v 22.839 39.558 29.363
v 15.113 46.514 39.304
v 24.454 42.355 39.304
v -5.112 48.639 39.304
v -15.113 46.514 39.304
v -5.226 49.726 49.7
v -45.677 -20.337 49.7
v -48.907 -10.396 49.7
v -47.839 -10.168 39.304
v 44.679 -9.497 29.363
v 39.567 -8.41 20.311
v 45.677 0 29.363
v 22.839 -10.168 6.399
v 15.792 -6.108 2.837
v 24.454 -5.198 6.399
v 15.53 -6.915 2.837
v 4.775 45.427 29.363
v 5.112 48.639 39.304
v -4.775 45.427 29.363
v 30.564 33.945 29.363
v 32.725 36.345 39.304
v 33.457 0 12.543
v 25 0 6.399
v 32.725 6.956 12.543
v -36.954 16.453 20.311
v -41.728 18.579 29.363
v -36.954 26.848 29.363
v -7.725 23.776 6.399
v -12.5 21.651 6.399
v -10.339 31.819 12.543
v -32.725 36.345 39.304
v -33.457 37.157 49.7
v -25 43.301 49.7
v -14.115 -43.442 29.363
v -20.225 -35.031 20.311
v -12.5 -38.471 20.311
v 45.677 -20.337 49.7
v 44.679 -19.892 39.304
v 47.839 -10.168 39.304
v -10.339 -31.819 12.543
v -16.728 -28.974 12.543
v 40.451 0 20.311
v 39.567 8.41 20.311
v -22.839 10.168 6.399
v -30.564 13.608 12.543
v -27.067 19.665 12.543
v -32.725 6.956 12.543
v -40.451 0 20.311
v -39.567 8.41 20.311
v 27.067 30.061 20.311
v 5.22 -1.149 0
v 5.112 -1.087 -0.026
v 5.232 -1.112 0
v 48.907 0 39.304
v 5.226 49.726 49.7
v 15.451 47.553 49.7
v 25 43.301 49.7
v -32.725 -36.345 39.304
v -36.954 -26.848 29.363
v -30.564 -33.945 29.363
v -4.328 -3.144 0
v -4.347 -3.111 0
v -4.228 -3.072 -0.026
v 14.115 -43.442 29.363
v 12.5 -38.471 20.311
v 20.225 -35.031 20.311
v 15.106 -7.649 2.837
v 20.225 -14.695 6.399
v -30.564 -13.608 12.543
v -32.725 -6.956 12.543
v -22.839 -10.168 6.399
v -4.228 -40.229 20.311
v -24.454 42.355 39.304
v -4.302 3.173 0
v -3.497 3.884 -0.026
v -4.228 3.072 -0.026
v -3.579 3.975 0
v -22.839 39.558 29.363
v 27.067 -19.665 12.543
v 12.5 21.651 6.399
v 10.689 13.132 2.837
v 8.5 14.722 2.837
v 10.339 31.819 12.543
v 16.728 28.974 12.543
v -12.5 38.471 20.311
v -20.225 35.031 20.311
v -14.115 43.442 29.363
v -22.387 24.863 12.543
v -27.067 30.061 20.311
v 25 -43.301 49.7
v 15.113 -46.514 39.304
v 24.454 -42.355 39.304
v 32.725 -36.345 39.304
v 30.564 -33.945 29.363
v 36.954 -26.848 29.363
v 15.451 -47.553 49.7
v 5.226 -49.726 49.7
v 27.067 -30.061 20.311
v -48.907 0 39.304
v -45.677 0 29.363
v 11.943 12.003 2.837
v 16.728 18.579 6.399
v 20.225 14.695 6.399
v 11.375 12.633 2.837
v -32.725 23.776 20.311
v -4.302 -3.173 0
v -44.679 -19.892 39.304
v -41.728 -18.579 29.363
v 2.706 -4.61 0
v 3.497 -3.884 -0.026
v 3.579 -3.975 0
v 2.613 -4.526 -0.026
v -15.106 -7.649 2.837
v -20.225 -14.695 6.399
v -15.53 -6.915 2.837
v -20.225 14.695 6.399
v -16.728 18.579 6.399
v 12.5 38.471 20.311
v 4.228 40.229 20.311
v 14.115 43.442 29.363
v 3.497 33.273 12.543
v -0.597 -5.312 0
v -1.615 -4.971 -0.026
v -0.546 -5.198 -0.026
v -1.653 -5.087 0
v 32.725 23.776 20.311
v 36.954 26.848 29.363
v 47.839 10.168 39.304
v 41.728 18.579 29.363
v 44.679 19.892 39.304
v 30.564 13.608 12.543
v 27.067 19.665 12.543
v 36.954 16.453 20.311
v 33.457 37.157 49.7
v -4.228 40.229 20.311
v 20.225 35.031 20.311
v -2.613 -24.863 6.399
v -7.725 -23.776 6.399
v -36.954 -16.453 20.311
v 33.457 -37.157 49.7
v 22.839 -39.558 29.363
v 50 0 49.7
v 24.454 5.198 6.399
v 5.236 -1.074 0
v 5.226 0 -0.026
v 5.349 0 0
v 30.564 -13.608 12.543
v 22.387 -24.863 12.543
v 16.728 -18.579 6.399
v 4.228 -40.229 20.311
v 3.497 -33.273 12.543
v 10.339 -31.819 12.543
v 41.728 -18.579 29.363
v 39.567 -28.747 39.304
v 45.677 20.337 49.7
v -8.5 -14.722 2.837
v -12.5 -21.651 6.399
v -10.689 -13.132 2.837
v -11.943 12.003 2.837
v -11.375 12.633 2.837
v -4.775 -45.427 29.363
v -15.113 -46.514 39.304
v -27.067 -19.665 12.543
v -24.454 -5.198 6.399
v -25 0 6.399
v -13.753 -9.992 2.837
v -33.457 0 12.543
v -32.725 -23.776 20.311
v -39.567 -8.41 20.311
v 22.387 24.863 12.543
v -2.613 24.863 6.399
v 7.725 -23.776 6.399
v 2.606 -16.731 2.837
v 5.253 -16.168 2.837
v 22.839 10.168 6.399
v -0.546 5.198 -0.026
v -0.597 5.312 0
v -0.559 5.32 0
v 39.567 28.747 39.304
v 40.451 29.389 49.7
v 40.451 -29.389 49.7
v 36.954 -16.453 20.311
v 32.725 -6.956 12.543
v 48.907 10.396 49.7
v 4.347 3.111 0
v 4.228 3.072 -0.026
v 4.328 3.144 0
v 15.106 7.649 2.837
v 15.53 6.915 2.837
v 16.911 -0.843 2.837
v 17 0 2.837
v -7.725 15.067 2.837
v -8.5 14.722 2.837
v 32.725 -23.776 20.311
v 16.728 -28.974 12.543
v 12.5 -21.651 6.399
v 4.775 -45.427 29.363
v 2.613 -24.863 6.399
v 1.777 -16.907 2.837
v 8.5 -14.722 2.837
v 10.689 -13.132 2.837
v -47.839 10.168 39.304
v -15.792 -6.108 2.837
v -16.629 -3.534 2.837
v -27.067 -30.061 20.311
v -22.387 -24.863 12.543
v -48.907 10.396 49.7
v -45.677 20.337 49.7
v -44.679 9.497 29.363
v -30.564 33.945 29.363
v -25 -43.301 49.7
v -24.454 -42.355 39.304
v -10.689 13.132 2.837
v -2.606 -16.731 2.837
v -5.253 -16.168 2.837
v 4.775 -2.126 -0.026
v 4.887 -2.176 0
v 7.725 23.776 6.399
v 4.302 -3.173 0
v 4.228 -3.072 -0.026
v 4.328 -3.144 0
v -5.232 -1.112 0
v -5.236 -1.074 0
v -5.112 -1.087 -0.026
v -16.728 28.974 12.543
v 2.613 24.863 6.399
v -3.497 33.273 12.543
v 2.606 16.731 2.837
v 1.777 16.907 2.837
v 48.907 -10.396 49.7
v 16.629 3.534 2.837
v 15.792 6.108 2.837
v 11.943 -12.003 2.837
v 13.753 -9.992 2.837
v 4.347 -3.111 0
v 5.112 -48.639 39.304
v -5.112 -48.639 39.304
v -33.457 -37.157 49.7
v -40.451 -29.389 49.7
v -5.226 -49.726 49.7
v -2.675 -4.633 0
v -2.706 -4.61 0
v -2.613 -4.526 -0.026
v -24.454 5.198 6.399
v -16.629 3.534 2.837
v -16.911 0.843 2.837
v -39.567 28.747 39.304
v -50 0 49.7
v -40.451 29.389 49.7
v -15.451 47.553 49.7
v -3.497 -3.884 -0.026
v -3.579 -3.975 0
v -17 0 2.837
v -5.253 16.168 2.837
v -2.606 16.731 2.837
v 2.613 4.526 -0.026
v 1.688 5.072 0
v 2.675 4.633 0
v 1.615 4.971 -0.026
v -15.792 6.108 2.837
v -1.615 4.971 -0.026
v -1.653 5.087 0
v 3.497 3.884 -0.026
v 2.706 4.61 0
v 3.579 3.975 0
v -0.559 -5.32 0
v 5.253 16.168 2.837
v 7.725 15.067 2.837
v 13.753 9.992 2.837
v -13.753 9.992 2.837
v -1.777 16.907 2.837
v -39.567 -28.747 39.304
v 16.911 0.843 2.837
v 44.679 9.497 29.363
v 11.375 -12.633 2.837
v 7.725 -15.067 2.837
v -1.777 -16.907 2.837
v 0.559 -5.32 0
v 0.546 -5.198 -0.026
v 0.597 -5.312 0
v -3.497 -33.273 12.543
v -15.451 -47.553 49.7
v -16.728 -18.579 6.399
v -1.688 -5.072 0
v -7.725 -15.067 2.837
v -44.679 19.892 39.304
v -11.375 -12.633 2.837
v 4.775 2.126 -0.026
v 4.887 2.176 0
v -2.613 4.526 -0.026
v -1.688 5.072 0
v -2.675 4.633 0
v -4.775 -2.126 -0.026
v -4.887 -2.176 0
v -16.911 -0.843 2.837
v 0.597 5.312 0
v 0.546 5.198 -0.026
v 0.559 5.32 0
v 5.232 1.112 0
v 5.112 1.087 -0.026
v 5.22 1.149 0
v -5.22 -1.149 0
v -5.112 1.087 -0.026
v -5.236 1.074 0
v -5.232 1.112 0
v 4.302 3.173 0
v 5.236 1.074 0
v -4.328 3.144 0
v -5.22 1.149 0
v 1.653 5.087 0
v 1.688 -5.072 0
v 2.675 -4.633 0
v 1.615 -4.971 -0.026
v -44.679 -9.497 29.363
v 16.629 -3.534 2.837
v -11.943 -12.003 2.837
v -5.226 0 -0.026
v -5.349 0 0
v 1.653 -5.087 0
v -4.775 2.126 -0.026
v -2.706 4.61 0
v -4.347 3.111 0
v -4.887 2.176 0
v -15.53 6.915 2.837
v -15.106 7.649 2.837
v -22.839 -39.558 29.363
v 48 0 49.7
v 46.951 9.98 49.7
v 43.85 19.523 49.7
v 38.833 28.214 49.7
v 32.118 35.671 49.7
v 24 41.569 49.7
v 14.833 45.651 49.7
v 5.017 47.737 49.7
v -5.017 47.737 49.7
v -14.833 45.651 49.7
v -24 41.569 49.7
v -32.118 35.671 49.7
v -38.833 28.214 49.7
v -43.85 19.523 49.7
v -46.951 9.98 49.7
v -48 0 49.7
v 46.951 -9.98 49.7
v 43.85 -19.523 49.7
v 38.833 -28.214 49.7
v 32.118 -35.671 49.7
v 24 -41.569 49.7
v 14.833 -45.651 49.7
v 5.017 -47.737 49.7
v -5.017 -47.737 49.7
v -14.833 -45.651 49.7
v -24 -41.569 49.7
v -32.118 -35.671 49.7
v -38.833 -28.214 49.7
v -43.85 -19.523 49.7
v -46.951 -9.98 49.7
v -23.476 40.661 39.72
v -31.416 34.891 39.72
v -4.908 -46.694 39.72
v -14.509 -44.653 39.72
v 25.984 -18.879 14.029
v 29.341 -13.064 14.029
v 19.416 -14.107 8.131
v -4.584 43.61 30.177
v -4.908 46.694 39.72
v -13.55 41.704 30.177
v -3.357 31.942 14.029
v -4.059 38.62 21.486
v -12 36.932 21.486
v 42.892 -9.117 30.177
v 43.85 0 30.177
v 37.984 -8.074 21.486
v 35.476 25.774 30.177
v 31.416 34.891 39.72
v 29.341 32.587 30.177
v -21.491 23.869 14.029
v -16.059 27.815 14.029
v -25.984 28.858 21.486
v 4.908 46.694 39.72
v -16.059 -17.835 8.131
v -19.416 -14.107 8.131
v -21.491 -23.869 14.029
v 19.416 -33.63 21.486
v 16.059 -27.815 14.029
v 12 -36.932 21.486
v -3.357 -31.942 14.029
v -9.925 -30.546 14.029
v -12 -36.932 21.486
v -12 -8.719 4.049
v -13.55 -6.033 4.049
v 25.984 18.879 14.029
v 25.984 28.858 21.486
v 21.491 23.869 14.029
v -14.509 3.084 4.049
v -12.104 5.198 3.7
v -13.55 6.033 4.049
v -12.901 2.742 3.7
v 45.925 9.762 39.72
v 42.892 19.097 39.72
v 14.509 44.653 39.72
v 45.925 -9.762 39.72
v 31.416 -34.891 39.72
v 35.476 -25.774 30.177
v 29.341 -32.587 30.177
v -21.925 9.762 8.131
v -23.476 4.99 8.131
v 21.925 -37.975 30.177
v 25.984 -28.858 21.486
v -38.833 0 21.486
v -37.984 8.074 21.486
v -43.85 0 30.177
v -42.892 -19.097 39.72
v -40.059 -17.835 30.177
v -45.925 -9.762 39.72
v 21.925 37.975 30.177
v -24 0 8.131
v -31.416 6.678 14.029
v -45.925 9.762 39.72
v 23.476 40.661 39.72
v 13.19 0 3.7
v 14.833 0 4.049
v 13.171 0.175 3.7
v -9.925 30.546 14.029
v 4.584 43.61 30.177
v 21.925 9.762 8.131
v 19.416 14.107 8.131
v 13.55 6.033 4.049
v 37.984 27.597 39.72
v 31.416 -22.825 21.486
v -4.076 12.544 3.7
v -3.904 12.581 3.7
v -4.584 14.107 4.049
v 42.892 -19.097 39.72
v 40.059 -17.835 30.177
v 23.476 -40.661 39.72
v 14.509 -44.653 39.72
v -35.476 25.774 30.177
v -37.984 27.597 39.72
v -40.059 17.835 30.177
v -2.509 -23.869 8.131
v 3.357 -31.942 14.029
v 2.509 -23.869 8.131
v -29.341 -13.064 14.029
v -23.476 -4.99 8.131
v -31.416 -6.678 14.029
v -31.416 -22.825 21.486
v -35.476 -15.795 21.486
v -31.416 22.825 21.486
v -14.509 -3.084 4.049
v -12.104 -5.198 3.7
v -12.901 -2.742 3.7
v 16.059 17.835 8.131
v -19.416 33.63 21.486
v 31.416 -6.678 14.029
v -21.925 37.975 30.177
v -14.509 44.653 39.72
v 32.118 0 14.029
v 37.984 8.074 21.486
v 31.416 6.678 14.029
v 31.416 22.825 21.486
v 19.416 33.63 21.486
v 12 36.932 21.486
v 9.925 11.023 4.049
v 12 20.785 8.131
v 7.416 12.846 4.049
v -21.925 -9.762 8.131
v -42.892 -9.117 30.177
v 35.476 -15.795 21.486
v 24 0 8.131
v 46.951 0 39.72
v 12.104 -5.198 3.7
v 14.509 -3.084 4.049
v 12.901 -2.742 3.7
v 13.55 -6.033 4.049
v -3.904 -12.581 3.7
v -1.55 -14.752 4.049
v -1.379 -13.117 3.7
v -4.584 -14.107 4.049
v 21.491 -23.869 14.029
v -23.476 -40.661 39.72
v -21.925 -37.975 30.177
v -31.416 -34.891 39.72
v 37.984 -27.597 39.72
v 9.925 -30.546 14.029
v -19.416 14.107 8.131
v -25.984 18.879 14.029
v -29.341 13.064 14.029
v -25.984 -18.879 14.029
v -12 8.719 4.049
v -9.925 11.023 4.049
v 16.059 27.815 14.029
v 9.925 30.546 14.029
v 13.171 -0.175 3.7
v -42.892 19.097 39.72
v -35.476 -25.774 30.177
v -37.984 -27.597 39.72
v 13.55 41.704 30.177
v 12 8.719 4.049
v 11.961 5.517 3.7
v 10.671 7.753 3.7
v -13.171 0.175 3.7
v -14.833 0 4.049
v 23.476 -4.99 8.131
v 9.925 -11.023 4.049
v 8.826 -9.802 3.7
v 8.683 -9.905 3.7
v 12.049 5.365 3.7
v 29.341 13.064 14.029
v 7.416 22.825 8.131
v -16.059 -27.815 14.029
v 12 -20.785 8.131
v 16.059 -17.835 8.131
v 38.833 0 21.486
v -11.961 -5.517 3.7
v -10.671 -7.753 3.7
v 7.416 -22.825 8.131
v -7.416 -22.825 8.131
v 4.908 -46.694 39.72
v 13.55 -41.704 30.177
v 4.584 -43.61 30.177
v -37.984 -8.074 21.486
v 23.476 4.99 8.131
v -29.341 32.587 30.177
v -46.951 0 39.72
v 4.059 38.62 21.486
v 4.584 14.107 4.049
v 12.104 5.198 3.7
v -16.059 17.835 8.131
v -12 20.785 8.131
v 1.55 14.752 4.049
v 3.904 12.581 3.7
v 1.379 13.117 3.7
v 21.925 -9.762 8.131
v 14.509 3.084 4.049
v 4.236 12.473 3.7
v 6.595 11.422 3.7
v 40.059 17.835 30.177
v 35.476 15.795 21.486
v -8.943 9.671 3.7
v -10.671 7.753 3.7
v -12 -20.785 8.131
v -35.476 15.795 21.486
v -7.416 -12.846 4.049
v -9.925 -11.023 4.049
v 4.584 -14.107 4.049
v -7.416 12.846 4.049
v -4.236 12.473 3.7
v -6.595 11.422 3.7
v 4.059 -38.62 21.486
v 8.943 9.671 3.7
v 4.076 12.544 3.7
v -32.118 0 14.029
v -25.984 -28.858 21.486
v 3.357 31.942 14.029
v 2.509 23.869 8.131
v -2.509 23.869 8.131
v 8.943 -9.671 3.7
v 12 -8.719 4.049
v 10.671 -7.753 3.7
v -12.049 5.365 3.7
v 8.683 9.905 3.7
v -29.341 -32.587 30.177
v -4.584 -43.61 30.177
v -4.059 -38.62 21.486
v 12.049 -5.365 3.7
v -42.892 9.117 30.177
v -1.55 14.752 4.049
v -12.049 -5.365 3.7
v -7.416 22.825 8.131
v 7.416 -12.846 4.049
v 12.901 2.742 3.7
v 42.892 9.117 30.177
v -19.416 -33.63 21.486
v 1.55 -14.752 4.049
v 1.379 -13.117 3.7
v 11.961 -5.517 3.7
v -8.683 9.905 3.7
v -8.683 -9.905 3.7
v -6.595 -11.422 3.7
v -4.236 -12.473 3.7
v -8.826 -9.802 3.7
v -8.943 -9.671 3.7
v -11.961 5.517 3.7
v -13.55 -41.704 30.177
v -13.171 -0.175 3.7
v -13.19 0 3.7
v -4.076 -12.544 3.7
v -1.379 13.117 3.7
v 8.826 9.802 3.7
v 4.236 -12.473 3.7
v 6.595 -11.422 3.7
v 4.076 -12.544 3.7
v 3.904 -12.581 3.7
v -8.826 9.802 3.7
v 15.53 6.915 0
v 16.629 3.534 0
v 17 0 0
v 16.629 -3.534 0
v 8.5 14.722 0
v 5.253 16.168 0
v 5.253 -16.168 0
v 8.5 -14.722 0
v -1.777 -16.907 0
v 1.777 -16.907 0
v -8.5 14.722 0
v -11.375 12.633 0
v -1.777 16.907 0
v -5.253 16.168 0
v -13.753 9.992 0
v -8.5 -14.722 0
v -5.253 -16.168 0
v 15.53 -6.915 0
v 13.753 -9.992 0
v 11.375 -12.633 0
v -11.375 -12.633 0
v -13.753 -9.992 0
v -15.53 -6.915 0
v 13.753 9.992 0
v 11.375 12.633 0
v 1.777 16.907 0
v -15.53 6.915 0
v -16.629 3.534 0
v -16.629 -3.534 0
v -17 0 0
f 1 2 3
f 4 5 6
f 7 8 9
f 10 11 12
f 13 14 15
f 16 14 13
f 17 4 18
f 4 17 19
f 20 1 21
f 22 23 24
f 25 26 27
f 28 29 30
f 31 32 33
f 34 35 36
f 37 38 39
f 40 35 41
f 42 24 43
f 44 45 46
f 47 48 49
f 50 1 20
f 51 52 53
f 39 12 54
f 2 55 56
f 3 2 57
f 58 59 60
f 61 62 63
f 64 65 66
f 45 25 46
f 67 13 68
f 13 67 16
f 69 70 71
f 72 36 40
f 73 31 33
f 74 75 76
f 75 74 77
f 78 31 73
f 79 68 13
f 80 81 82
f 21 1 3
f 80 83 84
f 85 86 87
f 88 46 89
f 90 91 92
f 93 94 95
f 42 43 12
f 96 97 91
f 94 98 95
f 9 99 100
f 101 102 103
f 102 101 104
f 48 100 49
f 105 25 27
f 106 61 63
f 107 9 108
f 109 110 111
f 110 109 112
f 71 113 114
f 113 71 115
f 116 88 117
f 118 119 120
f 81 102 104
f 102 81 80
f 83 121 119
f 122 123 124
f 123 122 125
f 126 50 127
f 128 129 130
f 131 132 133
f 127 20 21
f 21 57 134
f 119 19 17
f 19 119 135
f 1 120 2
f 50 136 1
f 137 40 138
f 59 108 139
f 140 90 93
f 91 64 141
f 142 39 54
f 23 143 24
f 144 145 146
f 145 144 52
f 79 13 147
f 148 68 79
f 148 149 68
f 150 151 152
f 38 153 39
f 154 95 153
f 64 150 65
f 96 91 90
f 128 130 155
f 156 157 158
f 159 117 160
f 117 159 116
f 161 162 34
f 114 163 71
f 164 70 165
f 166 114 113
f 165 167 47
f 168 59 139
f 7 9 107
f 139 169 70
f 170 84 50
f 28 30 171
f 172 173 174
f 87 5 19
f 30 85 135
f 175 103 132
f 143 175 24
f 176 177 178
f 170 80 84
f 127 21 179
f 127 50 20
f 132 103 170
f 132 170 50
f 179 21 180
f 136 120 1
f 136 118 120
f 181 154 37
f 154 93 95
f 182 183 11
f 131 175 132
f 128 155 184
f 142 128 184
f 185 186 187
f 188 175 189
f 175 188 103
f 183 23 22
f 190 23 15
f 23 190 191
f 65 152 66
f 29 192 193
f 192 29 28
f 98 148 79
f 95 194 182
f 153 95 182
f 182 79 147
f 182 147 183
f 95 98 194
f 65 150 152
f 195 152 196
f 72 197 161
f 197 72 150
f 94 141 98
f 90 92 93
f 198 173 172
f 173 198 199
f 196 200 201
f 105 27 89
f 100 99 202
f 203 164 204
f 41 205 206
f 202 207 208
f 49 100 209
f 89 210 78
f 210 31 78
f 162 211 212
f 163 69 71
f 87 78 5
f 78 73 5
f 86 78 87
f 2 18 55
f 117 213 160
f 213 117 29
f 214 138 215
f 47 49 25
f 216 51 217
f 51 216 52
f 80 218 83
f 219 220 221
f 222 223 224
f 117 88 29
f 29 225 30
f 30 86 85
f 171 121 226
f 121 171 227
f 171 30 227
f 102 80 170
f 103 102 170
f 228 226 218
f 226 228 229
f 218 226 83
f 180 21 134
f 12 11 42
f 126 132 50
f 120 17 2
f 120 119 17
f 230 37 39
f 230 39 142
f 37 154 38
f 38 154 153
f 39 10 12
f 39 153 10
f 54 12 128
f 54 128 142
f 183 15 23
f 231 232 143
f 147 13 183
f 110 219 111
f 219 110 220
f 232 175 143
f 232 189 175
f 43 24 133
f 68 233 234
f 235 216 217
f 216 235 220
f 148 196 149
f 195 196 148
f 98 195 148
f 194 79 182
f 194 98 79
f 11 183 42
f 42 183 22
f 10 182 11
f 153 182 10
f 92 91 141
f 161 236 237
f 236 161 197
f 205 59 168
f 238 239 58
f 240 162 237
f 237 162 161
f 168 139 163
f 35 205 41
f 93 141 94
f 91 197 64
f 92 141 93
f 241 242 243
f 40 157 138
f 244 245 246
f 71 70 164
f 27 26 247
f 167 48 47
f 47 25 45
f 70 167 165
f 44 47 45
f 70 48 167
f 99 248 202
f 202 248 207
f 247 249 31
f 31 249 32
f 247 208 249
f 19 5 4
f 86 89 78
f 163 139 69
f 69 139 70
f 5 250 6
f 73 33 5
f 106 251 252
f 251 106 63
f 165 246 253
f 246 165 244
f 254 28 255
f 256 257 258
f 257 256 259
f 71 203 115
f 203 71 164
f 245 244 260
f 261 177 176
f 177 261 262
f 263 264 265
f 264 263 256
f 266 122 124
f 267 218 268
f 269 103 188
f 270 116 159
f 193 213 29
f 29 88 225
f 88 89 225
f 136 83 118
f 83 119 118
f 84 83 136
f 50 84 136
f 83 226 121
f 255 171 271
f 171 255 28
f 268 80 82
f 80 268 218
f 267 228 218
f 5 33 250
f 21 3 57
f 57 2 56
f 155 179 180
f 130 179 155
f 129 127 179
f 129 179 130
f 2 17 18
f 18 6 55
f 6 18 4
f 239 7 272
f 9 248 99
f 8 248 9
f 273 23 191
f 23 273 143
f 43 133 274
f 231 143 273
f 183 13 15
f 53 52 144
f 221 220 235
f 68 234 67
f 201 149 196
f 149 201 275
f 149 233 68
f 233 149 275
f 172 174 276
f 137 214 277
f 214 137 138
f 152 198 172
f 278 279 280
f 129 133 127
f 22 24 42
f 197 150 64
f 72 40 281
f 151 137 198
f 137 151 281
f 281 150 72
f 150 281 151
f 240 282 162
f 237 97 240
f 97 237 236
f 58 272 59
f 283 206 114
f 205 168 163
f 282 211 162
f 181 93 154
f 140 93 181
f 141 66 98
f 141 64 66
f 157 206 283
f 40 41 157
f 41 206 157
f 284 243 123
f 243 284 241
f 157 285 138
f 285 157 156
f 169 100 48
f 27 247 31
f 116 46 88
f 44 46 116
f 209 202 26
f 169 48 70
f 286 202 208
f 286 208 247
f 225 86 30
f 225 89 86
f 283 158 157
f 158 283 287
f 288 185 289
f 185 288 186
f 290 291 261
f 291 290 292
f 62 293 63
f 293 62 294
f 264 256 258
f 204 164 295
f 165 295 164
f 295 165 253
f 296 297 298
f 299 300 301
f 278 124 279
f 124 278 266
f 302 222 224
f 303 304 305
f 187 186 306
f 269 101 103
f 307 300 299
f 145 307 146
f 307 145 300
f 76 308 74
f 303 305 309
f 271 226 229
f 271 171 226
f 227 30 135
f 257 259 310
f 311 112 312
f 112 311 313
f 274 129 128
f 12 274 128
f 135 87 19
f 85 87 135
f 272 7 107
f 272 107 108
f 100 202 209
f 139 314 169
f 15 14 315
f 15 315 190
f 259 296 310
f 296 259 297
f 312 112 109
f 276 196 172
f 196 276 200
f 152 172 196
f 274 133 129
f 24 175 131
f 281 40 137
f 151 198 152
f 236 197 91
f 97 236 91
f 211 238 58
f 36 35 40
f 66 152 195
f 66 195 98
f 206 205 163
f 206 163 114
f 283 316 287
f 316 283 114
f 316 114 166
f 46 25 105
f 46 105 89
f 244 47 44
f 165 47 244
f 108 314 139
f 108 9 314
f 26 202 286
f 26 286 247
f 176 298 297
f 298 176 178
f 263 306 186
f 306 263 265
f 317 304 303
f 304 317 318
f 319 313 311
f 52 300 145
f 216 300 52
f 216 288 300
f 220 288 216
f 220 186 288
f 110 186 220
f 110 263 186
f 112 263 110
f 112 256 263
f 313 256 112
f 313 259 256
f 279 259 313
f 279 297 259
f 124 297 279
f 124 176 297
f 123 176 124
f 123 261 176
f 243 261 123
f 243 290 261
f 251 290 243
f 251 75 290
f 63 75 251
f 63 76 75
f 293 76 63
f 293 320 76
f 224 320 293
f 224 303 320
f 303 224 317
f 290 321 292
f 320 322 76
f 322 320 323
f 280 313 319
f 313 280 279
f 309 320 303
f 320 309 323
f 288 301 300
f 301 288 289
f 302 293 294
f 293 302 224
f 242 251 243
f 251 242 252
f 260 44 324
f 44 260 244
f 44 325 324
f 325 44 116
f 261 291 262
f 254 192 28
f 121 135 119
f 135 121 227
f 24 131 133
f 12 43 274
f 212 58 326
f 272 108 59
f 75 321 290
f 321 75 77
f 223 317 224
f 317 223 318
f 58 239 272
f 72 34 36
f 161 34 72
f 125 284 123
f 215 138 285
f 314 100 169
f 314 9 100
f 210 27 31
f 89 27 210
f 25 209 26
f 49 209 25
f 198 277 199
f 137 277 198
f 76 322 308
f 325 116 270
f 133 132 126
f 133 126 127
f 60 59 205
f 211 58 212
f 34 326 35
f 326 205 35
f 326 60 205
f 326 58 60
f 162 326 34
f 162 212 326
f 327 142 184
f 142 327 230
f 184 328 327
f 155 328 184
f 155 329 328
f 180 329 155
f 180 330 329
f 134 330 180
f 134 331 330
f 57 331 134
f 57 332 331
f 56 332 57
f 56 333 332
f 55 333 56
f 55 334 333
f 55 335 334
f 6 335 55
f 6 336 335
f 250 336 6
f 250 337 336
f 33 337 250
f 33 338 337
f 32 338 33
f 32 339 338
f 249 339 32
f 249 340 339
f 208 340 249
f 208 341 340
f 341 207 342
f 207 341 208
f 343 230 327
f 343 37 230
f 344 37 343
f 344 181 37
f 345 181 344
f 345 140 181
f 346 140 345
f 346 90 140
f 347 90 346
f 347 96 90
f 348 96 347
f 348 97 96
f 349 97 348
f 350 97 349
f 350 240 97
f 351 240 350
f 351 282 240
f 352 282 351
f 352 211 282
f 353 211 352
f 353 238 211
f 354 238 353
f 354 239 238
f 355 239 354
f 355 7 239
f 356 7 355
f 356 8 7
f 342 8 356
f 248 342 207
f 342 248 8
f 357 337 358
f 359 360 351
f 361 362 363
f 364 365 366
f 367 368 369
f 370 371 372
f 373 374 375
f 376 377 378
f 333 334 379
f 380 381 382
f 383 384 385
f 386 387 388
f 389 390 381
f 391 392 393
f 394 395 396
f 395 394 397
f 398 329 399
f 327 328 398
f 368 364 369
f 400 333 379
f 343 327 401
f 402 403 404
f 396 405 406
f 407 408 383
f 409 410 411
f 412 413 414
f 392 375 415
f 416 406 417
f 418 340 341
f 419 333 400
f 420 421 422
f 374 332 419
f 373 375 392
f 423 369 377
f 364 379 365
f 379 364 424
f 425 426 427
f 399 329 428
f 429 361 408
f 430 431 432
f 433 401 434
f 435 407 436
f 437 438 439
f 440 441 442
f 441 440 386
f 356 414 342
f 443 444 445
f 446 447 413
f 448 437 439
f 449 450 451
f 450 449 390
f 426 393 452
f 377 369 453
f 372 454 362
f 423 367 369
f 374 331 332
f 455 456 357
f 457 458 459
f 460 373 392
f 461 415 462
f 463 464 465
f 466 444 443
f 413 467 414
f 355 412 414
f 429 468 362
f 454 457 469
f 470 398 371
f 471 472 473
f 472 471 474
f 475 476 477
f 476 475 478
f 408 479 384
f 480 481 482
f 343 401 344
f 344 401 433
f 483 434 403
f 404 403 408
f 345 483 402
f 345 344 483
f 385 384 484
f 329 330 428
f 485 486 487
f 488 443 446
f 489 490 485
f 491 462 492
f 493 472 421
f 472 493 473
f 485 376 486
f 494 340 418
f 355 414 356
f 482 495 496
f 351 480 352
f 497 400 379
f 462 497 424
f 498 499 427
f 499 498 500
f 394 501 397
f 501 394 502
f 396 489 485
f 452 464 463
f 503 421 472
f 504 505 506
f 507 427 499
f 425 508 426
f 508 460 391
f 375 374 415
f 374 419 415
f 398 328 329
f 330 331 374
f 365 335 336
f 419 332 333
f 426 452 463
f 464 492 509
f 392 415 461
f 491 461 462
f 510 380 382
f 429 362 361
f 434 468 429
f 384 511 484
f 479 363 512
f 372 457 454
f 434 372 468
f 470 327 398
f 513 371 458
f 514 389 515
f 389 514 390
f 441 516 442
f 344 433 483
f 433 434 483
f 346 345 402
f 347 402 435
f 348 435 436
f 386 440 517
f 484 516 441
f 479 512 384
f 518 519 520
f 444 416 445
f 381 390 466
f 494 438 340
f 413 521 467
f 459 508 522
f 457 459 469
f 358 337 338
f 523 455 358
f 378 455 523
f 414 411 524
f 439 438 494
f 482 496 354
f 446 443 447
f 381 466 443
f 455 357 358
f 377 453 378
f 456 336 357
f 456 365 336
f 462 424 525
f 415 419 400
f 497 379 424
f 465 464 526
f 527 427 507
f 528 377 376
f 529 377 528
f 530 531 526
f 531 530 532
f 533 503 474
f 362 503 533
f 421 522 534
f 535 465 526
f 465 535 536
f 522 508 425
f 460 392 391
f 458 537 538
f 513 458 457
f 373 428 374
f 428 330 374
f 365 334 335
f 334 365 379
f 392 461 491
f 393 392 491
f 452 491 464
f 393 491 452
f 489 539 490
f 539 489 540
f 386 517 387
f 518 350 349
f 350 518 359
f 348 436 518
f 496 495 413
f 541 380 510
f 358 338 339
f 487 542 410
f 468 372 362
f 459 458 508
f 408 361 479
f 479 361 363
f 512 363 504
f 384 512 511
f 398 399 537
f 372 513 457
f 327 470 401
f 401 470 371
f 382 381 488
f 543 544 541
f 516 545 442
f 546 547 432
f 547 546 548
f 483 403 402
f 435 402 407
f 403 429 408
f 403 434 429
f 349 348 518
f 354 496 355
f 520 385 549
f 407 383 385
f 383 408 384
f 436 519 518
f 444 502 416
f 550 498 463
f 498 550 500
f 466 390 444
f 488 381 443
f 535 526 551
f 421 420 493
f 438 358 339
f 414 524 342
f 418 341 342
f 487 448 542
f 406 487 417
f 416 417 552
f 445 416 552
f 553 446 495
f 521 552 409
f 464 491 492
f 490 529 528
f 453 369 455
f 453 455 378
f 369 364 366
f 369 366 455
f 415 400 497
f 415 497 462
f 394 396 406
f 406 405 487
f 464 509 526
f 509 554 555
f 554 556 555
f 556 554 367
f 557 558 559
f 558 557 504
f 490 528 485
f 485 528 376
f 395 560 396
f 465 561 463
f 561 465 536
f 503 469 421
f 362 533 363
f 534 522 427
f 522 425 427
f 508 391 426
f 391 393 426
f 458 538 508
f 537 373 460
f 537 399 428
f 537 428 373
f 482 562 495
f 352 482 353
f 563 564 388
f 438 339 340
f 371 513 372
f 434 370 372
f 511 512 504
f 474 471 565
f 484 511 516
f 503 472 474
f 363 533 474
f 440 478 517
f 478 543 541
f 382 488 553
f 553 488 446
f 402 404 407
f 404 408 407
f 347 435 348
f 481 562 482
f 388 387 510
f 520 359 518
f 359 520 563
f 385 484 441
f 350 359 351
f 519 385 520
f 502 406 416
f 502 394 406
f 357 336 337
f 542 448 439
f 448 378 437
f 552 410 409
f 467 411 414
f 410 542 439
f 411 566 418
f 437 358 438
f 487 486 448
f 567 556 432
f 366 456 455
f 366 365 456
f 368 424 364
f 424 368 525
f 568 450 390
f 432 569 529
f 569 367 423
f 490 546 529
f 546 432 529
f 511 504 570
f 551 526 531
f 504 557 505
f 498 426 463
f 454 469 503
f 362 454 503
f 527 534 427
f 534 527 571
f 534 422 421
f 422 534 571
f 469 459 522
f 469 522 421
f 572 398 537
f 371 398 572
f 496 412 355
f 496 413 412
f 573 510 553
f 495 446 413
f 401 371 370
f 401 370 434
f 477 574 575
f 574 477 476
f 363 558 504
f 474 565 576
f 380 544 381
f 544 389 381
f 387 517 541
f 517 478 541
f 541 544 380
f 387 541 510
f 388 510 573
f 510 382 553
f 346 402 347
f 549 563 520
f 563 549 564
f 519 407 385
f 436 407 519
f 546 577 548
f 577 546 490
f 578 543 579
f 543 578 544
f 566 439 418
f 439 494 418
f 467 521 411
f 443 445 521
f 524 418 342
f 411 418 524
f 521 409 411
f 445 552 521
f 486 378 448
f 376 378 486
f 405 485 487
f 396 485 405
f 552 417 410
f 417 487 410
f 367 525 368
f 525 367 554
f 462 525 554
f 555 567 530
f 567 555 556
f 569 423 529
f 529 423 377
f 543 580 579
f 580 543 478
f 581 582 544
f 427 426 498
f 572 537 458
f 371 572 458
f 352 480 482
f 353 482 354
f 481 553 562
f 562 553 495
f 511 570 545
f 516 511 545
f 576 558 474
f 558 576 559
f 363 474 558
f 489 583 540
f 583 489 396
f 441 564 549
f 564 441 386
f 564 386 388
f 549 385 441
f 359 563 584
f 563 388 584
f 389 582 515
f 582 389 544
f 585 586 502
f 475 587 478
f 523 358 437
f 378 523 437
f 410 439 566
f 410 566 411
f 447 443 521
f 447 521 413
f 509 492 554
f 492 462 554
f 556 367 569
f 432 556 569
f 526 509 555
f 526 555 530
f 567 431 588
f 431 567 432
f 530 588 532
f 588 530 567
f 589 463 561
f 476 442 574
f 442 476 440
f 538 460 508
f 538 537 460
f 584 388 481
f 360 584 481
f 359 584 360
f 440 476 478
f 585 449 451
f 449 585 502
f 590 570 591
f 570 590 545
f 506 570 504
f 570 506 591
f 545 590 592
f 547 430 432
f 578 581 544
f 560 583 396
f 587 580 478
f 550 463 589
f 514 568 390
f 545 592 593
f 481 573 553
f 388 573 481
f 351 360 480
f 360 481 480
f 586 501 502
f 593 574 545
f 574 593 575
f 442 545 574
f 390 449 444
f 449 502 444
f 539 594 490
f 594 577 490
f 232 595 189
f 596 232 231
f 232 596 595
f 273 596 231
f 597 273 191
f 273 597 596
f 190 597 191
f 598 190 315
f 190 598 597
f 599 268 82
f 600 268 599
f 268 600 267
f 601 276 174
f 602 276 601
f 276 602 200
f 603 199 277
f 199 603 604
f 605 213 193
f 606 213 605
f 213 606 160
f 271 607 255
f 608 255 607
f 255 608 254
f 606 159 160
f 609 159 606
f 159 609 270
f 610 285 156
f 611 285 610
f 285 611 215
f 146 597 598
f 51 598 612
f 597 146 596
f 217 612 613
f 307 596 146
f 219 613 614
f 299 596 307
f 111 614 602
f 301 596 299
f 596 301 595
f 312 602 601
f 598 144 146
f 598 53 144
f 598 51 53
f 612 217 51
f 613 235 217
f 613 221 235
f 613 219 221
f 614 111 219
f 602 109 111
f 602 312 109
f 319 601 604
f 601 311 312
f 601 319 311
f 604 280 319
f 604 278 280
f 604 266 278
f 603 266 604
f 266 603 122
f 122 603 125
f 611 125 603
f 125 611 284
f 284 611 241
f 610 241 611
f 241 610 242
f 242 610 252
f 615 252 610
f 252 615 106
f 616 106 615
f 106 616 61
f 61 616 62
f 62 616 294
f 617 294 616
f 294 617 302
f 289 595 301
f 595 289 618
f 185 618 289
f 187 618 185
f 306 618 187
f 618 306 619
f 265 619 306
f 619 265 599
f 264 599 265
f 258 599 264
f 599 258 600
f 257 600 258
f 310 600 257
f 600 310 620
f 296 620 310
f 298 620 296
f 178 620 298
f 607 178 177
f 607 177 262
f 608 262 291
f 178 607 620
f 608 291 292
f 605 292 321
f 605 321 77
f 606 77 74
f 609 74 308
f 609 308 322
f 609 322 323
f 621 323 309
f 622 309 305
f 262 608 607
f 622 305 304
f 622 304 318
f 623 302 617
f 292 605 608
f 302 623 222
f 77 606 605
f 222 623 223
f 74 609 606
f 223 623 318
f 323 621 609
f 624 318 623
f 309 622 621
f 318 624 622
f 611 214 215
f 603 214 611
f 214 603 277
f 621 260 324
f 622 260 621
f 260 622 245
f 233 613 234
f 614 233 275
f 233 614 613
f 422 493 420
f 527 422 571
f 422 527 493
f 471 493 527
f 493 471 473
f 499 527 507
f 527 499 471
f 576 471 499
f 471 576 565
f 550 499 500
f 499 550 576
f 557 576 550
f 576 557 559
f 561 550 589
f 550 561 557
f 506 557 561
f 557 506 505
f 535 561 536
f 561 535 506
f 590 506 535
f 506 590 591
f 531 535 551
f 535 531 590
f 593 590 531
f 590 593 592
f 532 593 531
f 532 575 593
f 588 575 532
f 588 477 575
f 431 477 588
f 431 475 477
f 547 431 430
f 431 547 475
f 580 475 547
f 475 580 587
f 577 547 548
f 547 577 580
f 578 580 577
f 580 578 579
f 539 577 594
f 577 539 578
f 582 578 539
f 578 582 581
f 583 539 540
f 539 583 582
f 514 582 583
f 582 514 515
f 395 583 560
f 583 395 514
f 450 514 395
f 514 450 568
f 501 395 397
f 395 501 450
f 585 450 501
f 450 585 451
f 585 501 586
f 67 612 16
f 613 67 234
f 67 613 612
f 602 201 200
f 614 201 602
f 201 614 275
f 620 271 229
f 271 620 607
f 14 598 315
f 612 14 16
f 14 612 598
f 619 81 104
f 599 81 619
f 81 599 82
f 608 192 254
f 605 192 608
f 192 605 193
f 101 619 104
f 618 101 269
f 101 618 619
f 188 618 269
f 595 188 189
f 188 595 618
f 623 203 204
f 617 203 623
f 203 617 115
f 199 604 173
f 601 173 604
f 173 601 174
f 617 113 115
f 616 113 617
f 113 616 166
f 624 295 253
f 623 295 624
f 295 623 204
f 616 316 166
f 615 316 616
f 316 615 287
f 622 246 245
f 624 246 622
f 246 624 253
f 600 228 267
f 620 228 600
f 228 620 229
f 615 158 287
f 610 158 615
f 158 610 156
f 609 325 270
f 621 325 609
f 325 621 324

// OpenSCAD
module bol_supa(raza_baza,grosime_baza,raza_picior,raza_bol,grosime_perete_bol)
{
    baza_bol(raza_baza,grosime_baza);
        //translate([0,0,grosime_baza])
    picior_bol(raza_picior,inaltime_picior);
        translate([0,0,grosime_baza+inaltime_picior+raza_bol])
    bol(raza_bol,grosime_perete_bol);

}
//----------------------------
module baza_bol(raza_baza,grosime_baza)
{
 cylinder(h=grosime_baza,r=raza_baza);
}
//---------------
module picior_bol(raza_picior,inaltime_picior)
{
  cylinder(r=raza_picior,h=inaltime_picior);  
}
//--------------
module bol(raza_bol,grosime_perete_bol)
{
  difference(){  
    sphere(r=raza_bol);
    translate([-raza_bol,-raza_bol,0])cube([2*raza_bol,2*raza_bol,raza_bol]); 
     sphere(r=raza_bol-grosime_perete_bol); 
  }
}
//-----------------

bol_supa(raza_baza=17,grosime_baza=3.7,raza_picior=2,inaltime_picior=-4,raza_bol=50,grosime_perete_bol=2);
